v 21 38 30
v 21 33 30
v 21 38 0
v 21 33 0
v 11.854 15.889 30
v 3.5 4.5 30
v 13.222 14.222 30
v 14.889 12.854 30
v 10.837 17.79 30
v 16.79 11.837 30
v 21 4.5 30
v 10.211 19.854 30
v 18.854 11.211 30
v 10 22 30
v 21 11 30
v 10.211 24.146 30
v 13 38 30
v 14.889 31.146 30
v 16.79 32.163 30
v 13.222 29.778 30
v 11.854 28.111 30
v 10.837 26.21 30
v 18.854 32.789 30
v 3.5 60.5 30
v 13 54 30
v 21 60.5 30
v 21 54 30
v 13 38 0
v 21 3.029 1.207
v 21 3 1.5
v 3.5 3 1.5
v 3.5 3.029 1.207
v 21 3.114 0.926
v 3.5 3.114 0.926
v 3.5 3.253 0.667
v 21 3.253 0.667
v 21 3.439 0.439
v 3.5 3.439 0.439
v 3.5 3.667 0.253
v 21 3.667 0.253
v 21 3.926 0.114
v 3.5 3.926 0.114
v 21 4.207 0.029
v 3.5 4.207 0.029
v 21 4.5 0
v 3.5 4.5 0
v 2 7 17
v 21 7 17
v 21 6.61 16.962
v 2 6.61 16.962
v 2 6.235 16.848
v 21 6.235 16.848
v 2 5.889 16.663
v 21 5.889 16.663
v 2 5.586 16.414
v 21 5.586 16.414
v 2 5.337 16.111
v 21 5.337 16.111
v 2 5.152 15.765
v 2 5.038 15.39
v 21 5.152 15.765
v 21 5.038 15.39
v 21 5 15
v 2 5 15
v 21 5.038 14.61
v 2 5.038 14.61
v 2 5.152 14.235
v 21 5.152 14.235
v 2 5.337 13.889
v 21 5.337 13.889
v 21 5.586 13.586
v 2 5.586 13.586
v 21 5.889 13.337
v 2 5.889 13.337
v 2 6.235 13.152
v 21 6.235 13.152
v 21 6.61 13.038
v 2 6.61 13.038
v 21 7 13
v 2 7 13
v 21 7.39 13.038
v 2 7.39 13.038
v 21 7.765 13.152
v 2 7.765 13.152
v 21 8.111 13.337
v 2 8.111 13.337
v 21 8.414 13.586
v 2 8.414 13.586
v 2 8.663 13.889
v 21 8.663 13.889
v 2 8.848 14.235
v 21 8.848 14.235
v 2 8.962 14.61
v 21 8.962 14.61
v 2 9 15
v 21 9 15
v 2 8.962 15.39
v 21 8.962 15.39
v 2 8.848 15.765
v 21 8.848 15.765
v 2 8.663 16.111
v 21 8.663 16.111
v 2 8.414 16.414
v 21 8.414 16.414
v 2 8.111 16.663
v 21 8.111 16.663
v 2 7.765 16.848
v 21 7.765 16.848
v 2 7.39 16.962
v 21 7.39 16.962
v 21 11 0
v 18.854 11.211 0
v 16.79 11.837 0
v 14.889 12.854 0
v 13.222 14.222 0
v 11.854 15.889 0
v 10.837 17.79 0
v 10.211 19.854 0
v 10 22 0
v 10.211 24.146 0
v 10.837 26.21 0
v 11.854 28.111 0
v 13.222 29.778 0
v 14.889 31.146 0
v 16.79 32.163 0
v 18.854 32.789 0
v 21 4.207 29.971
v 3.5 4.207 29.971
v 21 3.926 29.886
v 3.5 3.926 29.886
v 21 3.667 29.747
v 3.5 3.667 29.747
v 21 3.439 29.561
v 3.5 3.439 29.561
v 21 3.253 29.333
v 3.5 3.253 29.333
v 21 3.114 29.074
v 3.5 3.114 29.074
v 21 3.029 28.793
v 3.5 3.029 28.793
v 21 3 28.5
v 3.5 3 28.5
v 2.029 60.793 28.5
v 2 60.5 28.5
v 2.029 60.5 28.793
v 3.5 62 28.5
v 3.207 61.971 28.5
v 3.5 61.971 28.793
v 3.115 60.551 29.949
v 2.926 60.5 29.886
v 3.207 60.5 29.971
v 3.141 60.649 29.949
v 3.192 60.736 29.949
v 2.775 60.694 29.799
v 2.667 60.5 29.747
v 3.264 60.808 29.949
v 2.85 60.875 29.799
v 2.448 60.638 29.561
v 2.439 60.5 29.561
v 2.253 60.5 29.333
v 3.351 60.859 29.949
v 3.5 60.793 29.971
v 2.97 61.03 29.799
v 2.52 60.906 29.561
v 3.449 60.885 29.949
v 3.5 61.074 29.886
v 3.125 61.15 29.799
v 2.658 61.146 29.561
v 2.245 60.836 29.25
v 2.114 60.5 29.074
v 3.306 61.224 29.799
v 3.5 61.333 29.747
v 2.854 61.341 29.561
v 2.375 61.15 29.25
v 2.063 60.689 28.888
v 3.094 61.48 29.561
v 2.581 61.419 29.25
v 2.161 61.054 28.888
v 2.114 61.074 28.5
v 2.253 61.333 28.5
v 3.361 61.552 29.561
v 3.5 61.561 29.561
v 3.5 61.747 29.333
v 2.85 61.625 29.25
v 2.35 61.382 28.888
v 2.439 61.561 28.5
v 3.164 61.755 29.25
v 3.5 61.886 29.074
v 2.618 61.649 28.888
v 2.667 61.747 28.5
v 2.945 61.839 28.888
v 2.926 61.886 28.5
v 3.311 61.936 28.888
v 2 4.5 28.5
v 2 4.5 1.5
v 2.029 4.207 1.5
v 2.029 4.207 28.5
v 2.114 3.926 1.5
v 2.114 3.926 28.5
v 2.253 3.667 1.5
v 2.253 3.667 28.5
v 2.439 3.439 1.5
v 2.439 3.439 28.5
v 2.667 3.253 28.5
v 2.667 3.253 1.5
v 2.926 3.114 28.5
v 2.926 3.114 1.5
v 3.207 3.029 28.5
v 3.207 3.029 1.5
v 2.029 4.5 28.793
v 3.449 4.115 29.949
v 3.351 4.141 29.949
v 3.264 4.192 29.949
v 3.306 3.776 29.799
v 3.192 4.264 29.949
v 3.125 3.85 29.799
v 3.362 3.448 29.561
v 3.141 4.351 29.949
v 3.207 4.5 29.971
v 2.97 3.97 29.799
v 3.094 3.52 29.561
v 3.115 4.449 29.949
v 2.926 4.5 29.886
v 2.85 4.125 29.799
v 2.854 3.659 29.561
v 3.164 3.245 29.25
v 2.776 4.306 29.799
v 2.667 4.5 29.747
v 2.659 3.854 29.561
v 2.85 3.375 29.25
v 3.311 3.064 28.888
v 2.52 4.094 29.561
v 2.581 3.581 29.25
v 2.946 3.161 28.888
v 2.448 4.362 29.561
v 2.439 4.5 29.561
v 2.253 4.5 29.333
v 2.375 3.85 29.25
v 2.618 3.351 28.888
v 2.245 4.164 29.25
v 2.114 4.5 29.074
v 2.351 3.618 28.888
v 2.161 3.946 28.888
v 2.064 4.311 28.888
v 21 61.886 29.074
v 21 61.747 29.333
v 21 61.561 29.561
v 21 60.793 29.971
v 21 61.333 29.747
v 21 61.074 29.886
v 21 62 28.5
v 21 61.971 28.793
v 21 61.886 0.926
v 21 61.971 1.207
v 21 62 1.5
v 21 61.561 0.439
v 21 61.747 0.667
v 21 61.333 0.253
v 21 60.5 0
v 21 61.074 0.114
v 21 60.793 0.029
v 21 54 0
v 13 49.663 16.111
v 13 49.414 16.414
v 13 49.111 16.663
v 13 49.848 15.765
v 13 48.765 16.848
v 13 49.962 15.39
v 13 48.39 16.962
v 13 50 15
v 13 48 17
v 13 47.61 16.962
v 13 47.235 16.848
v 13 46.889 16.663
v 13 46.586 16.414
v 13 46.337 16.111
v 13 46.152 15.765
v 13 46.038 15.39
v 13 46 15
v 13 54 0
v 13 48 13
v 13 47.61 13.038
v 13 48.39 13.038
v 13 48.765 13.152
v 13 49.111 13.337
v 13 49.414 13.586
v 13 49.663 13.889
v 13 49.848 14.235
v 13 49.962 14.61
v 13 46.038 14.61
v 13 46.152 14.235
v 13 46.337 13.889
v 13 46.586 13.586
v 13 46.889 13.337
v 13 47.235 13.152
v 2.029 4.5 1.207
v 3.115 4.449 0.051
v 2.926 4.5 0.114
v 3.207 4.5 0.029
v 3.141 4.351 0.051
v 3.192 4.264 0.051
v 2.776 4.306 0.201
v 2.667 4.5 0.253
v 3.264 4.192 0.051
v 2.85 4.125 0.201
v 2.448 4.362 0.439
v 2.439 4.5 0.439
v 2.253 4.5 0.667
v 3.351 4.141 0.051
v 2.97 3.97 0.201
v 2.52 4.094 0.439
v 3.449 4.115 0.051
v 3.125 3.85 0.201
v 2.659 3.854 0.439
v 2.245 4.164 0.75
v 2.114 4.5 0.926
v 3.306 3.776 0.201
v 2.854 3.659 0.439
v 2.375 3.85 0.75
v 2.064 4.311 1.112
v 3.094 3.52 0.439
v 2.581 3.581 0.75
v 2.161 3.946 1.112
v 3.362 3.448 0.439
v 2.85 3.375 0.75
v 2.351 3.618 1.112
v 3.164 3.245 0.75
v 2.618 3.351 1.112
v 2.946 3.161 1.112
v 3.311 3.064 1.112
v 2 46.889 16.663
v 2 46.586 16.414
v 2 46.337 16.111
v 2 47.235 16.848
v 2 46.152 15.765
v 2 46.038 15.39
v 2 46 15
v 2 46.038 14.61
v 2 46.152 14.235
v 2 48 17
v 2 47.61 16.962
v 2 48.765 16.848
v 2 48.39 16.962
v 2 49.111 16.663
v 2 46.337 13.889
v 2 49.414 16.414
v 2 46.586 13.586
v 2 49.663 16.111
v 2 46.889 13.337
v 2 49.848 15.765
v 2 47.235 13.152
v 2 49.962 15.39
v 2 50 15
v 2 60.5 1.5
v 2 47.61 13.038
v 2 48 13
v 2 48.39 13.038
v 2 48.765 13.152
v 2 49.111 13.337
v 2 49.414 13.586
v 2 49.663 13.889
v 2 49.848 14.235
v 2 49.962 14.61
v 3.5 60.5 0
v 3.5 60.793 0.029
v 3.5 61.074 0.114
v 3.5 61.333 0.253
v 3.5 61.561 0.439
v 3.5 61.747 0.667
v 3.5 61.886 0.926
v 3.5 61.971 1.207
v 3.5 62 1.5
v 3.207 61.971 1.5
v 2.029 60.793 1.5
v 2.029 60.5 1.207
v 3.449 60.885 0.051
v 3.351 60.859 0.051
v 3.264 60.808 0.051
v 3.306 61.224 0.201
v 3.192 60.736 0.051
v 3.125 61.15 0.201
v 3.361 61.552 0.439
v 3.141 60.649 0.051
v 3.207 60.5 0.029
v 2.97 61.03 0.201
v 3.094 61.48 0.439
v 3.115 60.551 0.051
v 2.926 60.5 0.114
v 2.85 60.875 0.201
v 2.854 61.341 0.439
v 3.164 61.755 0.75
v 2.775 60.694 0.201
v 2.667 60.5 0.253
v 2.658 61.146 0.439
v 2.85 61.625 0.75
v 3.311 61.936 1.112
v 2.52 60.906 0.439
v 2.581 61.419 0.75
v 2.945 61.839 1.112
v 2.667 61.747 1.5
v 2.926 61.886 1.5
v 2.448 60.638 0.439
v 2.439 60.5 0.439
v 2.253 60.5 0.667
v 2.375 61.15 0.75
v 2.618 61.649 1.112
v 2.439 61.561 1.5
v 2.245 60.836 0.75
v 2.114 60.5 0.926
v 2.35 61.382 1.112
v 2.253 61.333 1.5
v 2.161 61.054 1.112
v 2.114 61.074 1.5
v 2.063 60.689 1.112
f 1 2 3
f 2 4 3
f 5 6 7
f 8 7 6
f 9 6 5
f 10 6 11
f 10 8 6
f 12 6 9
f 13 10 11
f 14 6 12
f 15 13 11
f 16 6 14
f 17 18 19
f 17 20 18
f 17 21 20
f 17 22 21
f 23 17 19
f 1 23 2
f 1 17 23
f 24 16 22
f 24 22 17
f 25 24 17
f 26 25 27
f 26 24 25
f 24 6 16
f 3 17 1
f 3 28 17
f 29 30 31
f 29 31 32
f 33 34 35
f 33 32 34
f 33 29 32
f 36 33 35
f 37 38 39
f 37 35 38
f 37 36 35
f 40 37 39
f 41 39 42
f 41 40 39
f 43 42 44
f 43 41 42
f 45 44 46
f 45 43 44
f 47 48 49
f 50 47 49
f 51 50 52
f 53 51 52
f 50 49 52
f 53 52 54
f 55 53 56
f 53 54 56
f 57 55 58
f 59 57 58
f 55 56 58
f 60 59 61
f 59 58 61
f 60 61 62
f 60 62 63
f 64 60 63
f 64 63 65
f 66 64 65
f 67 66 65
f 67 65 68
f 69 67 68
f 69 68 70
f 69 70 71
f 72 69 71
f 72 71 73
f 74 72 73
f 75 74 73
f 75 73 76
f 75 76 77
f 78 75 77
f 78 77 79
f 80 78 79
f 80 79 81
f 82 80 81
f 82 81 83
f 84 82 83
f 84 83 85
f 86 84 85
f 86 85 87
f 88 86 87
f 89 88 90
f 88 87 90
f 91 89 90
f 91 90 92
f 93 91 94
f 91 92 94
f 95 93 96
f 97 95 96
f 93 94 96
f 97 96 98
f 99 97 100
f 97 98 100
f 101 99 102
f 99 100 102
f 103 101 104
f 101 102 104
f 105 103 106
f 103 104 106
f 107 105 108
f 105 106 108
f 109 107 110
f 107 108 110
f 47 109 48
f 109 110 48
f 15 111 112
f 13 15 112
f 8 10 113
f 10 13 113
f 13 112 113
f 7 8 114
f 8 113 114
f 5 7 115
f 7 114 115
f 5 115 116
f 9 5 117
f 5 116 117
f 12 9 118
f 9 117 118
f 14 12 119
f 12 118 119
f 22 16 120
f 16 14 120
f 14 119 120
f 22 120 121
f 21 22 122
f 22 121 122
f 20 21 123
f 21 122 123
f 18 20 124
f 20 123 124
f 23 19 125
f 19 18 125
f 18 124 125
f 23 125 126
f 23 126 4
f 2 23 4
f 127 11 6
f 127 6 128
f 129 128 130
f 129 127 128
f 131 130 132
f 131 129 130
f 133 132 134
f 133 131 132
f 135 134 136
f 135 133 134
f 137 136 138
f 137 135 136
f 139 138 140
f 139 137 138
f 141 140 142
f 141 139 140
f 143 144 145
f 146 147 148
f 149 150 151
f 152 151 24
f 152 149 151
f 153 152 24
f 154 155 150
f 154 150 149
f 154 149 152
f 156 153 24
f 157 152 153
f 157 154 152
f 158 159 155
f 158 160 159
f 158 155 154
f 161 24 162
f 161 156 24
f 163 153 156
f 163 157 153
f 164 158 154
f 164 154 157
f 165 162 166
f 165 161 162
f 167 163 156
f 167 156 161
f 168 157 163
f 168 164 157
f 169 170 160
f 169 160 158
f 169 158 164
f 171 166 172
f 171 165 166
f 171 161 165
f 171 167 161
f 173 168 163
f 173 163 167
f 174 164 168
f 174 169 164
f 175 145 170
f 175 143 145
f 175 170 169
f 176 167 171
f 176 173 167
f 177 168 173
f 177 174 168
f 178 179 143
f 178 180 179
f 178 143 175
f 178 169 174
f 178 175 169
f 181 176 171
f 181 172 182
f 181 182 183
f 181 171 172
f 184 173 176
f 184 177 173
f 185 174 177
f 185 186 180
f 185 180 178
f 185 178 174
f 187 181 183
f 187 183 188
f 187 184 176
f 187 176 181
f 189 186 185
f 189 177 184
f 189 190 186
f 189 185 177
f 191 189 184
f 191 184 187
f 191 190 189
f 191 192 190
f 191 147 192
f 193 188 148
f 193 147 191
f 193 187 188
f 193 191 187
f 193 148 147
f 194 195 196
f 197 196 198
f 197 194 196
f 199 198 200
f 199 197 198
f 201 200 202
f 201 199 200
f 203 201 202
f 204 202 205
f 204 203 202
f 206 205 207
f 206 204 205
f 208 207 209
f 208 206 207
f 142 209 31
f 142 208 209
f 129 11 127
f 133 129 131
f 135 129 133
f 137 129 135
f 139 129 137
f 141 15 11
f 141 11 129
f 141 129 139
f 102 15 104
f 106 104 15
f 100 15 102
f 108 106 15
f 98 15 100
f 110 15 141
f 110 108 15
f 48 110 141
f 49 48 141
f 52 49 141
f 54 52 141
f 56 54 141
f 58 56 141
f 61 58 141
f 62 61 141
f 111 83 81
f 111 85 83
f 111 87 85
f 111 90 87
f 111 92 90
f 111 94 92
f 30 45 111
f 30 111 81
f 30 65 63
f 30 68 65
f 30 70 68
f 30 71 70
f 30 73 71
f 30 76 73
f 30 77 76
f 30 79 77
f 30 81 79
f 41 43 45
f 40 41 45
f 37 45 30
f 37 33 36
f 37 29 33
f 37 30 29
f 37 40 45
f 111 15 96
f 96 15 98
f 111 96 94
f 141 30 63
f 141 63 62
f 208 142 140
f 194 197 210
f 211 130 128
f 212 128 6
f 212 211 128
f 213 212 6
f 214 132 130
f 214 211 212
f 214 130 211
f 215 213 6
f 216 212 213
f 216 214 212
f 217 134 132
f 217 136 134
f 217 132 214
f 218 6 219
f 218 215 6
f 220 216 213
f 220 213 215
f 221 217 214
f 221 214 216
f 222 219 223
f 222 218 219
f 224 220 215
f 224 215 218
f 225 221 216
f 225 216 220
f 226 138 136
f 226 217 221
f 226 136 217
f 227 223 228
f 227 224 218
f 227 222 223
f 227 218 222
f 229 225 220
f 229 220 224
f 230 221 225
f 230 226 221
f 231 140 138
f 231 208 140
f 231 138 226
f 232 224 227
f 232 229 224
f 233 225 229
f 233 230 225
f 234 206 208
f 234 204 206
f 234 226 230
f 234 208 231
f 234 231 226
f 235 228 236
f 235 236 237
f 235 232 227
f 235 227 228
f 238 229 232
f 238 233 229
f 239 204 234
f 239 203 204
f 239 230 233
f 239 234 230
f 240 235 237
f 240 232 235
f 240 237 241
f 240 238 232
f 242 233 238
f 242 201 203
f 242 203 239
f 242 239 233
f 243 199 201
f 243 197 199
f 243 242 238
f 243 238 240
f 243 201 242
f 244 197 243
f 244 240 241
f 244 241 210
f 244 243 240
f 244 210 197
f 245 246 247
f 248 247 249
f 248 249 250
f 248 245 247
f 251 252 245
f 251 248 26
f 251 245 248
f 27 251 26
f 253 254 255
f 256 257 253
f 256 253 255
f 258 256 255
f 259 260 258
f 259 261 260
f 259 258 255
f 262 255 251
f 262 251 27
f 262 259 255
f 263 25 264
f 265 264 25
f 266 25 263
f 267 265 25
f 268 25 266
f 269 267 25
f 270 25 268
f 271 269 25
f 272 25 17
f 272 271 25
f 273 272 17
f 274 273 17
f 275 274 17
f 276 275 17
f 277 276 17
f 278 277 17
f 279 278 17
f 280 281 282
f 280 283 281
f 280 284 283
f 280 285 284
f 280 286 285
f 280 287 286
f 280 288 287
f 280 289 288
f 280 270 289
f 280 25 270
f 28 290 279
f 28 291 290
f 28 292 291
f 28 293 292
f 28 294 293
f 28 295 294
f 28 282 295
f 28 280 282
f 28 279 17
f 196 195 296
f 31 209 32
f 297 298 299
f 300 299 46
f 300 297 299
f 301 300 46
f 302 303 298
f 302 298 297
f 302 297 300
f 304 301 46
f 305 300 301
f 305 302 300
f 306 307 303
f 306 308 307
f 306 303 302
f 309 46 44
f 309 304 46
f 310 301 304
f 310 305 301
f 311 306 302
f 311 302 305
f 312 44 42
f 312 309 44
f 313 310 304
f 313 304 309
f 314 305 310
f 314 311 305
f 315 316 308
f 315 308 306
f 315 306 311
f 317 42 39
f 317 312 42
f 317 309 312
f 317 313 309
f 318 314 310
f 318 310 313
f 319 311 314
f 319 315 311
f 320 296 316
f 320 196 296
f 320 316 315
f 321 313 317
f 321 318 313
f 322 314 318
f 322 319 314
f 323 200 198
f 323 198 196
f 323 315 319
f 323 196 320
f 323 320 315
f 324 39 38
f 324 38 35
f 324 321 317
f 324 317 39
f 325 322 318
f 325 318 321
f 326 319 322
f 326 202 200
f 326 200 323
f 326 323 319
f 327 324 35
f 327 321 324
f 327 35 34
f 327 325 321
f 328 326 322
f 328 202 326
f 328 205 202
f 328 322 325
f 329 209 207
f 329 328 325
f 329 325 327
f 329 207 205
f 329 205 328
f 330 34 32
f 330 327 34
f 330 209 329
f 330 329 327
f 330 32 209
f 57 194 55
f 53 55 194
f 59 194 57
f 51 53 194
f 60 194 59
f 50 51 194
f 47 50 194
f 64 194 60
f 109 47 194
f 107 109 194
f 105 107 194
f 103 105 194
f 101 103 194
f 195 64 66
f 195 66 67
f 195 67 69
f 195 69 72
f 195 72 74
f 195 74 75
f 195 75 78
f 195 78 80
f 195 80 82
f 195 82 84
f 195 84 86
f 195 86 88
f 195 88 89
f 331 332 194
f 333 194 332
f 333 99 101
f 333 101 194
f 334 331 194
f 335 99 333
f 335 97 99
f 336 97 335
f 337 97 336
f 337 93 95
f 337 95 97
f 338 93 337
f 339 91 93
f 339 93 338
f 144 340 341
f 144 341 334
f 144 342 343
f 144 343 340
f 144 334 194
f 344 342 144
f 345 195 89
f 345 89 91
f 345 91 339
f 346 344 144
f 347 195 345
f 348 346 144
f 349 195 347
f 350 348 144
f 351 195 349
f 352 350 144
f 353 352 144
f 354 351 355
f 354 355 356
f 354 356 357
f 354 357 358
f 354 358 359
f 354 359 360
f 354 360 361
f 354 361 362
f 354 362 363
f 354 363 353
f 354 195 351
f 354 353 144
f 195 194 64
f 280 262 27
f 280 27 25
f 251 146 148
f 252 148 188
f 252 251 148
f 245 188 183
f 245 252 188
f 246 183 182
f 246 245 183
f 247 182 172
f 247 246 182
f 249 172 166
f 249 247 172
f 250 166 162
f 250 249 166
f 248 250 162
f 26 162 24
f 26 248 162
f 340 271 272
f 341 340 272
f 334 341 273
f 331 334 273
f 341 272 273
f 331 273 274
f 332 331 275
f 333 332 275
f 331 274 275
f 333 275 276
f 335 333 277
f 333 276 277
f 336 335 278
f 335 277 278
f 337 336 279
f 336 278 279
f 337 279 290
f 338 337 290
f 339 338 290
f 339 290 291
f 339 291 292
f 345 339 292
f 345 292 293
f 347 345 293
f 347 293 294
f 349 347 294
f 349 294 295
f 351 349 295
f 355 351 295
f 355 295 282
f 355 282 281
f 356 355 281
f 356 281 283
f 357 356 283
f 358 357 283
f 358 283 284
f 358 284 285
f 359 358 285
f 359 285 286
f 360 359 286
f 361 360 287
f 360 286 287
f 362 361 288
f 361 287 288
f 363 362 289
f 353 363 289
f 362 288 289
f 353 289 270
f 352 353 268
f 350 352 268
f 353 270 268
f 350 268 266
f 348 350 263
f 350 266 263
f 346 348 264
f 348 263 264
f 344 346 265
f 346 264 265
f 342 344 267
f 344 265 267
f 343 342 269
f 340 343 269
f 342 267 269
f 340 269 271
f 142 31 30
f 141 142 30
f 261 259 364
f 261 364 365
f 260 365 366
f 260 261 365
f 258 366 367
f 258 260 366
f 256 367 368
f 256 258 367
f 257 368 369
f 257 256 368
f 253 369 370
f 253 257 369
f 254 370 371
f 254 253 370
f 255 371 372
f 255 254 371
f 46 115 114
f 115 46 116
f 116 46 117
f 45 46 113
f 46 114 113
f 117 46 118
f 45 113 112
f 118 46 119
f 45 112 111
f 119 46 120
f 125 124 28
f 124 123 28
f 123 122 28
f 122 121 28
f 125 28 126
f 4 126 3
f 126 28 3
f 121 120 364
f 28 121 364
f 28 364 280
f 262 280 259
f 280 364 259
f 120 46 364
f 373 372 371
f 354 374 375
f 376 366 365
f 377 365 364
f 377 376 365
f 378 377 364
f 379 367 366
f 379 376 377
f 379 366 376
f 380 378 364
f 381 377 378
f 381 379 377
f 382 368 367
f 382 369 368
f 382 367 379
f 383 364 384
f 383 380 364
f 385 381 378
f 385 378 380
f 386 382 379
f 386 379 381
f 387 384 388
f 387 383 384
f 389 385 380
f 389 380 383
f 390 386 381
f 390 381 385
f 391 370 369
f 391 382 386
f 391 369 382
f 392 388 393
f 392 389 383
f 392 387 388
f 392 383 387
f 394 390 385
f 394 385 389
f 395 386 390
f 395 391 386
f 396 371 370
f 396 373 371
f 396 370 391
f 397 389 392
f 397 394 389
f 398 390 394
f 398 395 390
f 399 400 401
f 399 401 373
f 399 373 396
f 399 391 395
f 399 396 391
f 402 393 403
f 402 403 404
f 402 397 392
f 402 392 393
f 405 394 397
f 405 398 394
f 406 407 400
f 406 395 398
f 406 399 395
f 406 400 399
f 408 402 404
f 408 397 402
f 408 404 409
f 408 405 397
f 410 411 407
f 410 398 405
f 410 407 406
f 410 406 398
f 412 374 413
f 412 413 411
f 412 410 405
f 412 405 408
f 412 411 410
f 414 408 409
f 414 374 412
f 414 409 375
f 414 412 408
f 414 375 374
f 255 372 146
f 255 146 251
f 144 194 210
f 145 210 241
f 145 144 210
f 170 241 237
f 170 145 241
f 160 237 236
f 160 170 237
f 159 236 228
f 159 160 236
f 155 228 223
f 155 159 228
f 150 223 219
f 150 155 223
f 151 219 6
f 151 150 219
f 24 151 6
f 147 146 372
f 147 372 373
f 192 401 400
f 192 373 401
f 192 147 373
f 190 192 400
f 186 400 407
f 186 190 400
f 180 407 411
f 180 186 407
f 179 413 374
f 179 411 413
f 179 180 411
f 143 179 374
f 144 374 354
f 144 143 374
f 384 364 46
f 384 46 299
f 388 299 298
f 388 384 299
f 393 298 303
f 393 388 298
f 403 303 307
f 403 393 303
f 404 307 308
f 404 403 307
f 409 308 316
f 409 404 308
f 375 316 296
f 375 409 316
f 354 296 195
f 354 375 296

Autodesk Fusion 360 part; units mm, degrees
sketch "Esboço1" plane through (0, 0, 0) normal (0, 0, 1) x (1, 0, 0)
  line L0 (1.9999, 62) -> (21, 62)
  line L1 (21, 62) -> (21, 54)
  line L2 (21, 54) -> (13, 54)
  line L3 (13, 54) -> (13, 38)
  line L4 (13, 38) -> (21, 38)
  arc A0 (21, 33) -> (21, 11) centre (21, 22) ccw
  line L5 (21, 11) -> (21, 3)
  line L6 (2, 3) -> (2, 62)
  line L7 (2, 3) -> (21, 3)
  line L8 (21, 33) -> (21, 38)
  line L9 (1.9999, 62) -> (2, 62)
  dimension "d1" = 11
  dimension "d2" = 16
  dimension "d3" = 8
  dimension "d5" = 8
  dimension "d8" = 8
  dimension "d10" = 8
  dimension "d35" = 5
  dimension "d36" = 19
extrude "Extrusão1" add sketch "Esboço1" along normal blind 30
hole "Furo2" at (2, 7, 15) direction (1, 0, 0) diameter 4 depth 21 tip angle 180
hole "Furo3" at (2, 48, 15) direction (1, 0, 0) diameter 4 depth 21 tip angle 180
fillet "Arredondamento4" radius 1.5 8 edges at (11.5, 62, 30) (2, 62, 15) (2, 32.5, 30) (2, 32.5, 0) (2, 3, 15) (11.5, 3, 0) (11.5, 3, 30) (11.5, 62, 0)
